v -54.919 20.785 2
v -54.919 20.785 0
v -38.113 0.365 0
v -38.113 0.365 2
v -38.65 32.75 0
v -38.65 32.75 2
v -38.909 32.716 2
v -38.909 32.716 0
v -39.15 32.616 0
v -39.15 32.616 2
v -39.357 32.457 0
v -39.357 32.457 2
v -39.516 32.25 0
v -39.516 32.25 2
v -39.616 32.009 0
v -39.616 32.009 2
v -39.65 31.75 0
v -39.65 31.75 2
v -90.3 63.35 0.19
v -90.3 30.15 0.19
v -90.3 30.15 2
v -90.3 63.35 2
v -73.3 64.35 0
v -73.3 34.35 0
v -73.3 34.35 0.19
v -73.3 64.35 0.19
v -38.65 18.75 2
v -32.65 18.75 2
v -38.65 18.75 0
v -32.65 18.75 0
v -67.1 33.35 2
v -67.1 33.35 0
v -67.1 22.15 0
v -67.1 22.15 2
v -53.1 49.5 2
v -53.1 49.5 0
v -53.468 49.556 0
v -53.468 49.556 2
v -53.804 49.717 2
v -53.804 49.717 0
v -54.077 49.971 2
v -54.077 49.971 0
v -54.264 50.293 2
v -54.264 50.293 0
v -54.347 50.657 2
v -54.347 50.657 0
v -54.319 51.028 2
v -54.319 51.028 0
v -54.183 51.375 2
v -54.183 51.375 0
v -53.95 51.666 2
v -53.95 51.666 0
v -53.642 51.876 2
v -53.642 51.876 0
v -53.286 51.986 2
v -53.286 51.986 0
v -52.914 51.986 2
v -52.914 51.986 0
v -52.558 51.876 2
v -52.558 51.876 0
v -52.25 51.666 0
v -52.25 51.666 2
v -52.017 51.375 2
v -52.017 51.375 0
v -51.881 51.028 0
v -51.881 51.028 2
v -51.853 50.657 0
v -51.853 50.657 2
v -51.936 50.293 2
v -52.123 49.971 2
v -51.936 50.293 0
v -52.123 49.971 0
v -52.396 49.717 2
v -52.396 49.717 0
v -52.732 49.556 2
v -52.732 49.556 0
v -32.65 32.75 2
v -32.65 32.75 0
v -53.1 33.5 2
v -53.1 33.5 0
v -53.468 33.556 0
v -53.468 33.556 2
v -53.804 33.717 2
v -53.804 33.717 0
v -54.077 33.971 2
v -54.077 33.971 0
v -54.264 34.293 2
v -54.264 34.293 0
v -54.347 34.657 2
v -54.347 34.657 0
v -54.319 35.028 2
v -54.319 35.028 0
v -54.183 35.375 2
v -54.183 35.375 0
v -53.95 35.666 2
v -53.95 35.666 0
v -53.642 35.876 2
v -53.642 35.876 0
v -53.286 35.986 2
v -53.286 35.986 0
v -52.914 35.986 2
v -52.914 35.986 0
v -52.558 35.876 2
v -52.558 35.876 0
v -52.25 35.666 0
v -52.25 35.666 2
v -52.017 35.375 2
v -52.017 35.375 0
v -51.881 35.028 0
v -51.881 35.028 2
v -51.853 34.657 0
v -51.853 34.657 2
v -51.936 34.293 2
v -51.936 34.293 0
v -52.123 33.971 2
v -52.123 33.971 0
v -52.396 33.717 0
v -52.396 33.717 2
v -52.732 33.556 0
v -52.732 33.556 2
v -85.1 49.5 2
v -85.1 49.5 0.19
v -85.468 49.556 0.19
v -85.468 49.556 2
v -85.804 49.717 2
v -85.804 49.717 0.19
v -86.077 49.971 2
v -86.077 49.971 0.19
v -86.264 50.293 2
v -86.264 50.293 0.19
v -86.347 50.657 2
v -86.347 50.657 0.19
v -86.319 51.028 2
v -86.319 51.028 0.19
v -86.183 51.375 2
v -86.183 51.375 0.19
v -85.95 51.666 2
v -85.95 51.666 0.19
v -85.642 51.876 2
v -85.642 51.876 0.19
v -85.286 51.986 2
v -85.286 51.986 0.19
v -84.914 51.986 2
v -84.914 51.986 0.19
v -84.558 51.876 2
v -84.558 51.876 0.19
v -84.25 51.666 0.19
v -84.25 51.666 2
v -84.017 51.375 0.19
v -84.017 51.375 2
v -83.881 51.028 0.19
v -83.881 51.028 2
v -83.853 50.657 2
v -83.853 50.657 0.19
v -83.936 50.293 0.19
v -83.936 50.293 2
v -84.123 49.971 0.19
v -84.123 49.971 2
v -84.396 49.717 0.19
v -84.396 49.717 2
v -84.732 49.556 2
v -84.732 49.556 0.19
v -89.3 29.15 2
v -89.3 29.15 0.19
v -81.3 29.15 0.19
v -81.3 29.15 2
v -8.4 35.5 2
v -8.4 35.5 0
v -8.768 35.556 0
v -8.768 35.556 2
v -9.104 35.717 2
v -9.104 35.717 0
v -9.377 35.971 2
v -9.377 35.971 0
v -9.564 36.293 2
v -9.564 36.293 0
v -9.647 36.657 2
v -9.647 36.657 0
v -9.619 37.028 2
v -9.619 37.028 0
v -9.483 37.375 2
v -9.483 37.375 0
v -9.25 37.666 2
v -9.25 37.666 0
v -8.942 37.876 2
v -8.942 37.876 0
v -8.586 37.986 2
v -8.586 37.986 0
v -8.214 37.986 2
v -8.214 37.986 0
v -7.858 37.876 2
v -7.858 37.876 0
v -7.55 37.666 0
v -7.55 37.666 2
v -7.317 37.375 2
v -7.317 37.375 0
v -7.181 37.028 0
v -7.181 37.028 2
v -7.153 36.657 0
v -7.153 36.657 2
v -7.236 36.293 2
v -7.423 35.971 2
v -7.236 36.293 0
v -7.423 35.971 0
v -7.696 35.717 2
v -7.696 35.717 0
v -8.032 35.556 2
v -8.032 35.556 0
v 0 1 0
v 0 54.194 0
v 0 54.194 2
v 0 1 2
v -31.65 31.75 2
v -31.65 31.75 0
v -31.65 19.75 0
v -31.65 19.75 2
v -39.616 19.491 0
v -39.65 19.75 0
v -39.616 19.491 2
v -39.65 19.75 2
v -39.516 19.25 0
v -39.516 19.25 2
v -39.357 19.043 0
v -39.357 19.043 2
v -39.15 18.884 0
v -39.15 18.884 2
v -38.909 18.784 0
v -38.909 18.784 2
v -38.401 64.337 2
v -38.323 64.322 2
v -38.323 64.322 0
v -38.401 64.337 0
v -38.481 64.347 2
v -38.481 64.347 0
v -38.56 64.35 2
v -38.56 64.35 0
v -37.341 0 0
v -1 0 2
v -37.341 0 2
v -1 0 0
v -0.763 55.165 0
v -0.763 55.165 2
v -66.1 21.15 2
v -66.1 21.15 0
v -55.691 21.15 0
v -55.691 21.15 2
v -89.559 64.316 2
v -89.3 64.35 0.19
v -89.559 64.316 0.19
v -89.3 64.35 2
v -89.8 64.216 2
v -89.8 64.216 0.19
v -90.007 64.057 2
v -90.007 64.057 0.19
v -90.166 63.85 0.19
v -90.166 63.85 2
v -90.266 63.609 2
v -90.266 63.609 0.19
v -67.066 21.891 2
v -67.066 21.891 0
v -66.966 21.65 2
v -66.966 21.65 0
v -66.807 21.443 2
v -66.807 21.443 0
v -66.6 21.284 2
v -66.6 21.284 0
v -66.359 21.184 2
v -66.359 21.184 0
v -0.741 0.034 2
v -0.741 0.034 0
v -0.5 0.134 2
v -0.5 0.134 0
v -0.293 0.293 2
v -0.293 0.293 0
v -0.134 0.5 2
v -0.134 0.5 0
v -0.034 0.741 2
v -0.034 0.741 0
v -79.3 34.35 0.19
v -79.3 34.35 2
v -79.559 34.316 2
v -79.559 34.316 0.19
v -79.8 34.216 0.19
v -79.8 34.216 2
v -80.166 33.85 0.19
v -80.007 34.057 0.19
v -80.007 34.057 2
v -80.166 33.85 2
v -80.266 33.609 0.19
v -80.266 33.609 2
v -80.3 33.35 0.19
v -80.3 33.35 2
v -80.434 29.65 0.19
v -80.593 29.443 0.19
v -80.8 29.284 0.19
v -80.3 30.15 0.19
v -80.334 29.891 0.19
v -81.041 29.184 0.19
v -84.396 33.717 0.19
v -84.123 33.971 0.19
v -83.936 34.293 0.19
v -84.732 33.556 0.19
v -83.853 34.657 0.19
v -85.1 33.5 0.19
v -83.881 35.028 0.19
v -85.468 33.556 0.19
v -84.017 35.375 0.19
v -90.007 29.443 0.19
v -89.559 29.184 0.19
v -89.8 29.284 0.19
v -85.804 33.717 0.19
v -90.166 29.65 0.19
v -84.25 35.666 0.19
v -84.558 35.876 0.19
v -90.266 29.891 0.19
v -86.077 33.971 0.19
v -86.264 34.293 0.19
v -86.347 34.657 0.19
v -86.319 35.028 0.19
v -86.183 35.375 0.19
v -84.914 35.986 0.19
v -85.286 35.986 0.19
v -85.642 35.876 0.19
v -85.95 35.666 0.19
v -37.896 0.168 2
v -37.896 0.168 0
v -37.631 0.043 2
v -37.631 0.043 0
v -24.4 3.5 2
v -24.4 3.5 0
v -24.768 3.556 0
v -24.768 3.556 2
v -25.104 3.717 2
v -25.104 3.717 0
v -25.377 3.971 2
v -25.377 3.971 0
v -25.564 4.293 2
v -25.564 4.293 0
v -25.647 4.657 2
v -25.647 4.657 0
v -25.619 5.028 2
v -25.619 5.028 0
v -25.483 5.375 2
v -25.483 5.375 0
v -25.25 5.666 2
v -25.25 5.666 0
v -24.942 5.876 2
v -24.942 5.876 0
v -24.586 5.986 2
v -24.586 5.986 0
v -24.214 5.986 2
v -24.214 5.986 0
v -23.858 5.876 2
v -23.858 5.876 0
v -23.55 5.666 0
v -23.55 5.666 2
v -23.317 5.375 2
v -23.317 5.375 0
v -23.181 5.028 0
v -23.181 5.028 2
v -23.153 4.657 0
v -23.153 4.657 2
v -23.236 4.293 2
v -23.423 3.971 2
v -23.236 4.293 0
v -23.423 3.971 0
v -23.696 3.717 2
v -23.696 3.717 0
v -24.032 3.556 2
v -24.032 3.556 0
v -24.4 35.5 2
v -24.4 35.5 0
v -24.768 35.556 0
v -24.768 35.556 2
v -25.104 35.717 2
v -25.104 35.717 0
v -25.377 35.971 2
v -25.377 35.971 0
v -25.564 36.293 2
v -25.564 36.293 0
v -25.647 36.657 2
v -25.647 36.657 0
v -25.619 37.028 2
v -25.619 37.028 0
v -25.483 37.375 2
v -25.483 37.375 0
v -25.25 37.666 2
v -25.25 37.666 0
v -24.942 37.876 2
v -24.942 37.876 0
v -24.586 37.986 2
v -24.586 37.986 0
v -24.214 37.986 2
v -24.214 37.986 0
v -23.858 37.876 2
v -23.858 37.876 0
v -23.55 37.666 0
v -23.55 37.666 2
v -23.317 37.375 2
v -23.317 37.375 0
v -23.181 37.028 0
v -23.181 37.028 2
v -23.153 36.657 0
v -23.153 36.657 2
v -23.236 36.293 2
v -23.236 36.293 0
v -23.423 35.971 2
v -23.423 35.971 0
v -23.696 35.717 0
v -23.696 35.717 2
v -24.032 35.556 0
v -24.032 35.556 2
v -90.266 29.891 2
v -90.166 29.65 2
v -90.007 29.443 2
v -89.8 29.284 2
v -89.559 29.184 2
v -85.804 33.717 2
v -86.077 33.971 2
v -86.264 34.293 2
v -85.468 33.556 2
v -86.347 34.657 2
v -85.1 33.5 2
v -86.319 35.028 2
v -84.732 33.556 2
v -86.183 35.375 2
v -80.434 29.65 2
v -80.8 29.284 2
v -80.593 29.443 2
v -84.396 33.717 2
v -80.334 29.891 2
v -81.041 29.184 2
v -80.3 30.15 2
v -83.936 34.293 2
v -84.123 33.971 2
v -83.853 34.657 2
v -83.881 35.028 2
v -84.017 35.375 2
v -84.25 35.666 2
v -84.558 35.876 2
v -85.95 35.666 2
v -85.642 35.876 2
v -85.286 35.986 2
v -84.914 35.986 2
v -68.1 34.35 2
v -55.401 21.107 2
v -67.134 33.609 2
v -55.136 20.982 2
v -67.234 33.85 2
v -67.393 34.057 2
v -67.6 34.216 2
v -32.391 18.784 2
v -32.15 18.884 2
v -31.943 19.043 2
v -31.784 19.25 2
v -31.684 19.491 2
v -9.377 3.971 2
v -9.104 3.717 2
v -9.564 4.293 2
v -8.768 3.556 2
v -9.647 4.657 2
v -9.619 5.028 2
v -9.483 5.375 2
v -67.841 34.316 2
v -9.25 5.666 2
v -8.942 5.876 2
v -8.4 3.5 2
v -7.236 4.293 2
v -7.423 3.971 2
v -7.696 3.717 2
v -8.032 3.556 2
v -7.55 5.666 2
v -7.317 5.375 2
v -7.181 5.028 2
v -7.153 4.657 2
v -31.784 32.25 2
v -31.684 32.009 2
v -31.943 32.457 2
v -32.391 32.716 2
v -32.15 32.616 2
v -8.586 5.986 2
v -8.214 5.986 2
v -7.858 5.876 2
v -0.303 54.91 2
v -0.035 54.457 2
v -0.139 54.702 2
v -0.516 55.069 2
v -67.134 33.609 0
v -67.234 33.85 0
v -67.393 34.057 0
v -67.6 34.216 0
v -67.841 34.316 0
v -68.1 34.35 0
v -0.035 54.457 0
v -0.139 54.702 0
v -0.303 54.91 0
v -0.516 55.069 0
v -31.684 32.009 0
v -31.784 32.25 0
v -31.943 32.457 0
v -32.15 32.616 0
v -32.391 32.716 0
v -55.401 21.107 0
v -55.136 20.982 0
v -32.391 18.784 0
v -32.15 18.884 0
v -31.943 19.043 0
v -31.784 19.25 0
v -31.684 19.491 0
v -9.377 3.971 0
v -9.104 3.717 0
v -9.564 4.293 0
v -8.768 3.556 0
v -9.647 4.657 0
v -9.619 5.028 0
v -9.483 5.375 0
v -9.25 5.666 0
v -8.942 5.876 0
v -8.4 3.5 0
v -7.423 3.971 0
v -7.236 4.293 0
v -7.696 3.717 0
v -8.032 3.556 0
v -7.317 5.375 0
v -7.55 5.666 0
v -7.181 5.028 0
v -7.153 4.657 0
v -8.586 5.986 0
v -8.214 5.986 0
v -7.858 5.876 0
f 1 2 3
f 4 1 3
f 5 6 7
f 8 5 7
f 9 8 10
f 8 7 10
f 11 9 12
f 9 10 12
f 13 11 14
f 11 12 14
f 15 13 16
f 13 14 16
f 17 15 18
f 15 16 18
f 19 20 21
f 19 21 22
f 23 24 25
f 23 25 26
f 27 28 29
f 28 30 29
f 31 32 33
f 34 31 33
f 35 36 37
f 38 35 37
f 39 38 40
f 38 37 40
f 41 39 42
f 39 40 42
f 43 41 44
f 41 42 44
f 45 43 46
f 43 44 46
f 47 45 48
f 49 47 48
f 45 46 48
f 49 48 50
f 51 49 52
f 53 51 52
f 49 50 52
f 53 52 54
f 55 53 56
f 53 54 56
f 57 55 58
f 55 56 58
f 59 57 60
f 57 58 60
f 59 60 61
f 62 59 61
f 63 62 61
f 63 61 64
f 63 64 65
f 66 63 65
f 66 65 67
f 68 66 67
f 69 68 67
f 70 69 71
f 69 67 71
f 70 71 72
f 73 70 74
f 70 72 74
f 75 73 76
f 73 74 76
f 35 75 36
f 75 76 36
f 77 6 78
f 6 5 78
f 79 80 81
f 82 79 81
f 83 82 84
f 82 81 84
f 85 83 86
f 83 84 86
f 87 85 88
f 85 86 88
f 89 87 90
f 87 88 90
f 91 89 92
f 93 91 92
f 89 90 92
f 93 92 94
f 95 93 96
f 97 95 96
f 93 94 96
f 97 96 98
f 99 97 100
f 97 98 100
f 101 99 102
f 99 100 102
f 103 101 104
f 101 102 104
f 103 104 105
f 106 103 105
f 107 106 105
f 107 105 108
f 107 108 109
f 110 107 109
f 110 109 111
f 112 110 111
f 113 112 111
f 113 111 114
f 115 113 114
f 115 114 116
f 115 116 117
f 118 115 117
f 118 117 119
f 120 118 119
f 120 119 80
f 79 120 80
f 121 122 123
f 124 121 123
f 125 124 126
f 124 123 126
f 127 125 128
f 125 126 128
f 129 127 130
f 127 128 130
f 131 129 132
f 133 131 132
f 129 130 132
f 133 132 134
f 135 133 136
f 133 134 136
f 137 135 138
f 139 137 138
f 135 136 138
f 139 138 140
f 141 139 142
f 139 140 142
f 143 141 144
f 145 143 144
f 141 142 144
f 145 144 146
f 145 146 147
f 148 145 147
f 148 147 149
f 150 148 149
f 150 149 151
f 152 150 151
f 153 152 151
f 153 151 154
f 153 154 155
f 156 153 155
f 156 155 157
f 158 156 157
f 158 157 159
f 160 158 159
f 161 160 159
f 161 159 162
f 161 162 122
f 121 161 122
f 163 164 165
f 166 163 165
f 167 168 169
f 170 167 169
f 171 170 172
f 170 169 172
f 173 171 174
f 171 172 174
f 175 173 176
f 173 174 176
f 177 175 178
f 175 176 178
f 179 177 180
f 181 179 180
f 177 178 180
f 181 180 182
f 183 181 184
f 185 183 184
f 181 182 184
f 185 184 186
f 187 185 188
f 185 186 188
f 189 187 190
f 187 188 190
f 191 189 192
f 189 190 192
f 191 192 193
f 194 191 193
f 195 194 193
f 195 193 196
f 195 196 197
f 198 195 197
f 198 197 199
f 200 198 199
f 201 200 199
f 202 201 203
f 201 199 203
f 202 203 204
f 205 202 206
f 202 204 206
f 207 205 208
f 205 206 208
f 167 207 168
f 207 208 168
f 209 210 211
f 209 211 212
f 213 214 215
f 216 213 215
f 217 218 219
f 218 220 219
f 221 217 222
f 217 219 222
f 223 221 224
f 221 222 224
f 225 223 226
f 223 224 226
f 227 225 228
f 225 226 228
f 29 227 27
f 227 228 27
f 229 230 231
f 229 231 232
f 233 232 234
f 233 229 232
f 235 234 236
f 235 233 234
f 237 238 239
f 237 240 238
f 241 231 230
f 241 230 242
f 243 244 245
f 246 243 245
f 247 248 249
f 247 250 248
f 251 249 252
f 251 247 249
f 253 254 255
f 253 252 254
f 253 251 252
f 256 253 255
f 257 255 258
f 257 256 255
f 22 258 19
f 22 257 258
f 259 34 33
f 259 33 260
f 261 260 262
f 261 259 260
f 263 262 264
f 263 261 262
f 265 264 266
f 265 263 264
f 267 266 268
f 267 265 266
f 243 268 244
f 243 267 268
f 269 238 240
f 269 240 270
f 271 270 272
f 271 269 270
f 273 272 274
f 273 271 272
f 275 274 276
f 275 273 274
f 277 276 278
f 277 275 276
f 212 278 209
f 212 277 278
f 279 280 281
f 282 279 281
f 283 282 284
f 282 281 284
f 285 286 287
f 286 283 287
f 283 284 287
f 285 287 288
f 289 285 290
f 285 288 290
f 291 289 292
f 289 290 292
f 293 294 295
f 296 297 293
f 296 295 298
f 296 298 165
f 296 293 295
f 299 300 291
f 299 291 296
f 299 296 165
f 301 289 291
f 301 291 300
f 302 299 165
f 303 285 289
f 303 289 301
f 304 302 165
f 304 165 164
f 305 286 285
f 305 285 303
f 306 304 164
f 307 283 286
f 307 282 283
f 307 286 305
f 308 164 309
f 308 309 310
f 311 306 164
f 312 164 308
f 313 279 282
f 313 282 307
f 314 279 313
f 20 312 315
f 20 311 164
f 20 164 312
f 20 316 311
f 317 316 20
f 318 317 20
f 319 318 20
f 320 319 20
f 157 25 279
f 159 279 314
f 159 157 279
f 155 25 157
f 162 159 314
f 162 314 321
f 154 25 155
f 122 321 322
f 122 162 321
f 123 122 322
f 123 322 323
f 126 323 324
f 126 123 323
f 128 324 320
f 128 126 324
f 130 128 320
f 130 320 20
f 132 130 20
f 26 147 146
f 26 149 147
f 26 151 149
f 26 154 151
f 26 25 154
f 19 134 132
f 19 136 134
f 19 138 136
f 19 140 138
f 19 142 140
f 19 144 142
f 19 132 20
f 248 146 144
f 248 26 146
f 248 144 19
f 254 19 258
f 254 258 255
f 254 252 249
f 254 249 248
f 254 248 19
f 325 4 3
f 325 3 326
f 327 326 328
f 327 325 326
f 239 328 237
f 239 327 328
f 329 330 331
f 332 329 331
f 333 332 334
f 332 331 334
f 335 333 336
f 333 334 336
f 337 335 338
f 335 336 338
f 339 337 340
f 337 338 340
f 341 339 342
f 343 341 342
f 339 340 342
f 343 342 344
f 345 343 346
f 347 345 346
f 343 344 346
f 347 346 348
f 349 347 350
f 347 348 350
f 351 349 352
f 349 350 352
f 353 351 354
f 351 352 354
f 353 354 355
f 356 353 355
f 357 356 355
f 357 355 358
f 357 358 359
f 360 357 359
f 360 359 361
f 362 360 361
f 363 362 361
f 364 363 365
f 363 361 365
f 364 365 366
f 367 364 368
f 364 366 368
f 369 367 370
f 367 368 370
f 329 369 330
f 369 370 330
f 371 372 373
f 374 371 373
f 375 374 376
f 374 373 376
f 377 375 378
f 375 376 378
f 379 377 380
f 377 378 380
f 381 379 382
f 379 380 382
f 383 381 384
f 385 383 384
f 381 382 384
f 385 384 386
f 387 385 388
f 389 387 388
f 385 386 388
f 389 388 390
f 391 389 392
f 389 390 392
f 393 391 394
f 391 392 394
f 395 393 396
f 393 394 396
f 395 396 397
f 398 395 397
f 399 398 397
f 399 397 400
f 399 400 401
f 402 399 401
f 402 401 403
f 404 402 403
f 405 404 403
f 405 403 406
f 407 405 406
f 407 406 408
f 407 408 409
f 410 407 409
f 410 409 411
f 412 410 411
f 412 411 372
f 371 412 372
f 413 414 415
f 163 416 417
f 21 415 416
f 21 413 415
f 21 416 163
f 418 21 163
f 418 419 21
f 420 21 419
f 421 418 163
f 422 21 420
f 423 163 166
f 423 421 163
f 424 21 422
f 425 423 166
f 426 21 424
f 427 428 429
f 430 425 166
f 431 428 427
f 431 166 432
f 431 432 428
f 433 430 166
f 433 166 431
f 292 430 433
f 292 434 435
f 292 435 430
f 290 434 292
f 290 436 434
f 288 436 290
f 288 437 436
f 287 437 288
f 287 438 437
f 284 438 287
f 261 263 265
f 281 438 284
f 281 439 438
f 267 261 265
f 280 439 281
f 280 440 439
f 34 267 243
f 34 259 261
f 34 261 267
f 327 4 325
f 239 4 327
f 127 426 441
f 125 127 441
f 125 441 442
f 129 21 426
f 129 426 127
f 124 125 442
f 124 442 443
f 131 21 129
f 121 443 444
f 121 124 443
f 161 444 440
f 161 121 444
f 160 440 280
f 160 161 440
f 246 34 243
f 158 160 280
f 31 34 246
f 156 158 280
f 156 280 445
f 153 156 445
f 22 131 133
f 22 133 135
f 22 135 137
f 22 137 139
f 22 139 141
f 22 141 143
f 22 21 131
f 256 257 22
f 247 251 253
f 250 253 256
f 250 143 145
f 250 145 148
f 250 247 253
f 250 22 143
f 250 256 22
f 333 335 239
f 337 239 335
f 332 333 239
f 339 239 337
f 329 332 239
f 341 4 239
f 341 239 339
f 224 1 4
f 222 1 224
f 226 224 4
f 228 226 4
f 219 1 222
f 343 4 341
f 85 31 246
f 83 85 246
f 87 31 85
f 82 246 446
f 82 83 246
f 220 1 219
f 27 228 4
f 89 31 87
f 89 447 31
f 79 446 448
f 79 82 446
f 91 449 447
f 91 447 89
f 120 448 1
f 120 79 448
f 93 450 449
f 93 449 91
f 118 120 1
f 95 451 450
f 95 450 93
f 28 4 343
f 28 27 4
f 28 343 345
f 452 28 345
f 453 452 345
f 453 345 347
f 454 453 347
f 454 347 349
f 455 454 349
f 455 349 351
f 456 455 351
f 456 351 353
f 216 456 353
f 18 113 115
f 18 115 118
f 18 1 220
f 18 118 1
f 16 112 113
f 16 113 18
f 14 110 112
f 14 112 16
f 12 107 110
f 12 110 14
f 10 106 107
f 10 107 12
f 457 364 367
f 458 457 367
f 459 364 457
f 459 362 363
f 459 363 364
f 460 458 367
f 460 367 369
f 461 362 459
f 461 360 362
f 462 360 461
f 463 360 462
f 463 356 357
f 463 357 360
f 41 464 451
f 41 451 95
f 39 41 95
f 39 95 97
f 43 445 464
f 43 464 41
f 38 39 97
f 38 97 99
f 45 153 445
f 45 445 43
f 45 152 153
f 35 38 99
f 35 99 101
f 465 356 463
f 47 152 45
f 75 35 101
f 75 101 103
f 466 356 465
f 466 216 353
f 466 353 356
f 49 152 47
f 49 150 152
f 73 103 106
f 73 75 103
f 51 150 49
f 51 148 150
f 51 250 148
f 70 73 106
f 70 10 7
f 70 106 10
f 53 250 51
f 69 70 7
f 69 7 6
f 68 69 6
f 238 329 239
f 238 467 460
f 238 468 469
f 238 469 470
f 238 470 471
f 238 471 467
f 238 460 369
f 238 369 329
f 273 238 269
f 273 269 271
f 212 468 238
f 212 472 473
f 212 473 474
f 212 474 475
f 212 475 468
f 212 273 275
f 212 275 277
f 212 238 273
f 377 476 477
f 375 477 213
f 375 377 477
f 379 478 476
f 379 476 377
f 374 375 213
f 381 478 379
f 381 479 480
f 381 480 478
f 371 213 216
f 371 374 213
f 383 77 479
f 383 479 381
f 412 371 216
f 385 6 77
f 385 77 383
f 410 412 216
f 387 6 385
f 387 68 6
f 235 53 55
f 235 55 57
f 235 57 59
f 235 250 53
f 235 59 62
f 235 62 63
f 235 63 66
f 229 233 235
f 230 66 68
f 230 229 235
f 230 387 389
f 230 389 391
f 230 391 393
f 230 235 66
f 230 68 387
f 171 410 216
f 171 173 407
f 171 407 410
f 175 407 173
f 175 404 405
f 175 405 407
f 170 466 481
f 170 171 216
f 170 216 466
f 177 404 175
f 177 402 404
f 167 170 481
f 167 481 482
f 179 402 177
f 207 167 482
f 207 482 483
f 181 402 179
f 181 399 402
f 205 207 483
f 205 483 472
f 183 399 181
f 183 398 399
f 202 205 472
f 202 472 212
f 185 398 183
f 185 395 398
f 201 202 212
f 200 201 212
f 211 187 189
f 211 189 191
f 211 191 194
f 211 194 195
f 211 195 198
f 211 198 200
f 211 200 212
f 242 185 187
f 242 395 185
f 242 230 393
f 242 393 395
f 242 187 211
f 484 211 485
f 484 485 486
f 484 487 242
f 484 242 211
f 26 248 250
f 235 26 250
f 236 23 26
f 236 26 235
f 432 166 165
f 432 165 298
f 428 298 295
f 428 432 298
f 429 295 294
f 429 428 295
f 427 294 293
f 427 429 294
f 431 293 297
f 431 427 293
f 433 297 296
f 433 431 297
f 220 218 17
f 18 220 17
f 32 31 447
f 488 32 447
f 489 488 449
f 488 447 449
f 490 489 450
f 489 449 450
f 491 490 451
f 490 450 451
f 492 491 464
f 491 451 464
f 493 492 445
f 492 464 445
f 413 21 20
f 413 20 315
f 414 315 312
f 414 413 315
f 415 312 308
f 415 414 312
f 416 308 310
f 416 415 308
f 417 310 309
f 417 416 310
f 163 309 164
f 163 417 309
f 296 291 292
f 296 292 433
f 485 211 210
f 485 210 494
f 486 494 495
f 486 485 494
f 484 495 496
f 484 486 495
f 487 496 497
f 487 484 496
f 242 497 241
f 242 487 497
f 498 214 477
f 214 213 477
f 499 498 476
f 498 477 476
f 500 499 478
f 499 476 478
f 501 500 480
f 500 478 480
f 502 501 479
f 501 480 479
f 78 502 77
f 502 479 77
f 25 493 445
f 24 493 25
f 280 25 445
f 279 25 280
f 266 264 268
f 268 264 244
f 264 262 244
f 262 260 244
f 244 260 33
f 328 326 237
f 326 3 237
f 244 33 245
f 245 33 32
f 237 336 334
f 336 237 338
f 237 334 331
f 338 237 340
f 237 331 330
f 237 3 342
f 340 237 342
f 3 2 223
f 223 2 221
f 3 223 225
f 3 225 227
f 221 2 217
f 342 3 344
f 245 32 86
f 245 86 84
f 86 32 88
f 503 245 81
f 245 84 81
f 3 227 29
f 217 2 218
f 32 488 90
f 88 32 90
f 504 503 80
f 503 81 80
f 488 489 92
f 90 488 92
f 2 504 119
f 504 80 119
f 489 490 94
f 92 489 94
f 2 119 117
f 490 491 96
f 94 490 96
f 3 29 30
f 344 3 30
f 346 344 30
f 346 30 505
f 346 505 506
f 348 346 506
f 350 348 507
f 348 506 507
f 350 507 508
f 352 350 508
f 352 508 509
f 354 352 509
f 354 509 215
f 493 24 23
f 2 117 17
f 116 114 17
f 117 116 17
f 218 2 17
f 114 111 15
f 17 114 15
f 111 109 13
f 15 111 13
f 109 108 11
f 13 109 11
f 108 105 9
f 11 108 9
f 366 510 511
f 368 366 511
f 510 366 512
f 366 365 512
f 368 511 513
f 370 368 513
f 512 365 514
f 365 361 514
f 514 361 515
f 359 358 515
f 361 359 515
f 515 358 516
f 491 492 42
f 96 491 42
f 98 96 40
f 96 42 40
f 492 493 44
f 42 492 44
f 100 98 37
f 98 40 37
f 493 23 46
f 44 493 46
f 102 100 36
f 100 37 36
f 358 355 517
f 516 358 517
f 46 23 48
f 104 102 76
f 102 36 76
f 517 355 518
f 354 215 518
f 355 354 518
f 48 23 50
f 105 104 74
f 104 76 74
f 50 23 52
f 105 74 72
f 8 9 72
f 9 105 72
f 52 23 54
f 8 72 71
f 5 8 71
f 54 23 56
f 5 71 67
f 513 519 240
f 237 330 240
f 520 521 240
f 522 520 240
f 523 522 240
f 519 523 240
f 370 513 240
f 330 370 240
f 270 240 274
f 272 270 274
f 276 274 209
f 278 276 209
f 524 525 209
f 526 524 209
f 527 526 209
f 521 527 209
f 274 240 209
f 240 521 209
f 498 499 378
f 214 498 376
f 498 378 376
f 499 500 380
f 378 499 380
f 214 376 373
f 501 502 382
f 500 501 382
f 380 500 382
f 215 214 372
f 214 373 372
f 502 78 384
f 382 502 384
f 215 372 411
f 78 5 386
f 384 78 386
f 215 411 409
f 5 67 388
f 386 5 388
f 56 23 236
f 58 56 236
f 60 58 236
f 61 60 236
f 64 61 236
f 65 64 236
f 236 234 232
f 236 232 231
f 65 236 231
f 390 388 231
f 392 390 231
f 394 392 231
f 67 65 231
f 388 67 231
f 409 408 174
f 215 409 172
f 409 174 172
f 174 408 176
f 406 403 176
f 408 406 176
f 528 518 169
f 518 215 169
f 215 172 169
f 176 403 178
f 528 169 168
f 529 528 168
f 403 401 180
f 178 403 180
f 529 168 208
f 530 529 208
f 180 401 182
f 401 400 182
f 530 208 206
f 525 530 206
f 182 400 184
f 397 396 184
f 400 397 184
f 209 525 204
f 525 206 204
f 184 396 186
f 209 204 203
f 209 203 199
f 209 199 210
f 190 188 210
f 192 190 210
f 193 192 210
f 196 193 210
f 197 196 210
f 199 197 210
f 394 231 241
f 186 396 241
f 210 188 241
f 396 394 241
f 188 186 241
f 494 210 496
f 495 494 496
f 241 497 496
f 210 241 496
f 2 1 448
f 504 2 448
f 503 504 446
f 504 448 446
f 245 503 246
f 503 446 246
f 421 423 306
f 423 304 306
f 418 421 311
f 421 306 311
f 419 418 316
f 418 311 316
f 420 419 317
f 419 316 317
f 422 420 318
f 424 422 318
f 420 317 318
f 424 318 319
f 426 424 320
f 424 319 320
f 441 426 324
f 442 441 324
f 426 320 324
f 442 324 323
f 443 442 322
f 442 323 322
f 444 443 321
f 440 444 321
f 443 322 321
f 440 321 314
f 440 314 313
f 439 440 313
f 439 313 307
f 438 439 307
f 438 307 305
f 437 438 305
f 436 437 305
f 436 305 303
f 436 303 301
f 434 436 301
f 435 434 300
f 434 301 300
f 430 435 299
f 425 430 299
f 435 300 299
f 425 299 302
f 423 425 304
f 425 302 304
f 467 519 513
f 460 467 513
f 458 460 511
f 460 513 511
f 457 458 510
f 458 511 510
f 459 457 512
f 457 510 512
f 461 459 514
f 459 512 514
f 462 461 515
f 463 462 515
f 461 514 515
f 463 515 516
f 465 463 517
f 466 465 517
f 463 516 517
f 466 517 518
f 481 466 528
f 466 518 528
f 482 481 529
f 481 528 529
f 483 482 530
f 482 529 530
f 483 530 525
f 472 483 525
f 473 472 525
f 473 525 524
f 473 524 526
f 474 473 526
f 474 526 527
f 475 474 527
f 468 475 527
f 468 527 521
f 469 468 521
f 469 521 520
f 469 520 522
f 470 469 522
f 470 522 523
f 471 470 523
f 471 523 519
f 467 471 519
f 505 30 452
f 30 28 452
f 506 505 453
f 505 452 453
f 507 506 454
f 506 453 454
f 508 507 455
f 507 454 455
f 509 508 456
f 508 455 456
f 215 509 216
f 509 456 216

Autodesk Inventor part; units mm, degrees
ref_plane "YZ Plane" through (0, 0, 0) normal (1, 0, 0) x (0, 1, 0)
ref_plane "XZ Plane" through (0, 0, 0) normal (0, 1, 0) x (-1, 0, 0)
ref_plane "XY Plane" through (0, 0, 0) normal (0, 0, 1) x (1, 0, 0)
sketch "スケッチ1" plane through (0, 0, 0) normal (0, 0, 1) x (1, 0, 0)
  line L0 (0, 0) -> (-90.3, 0)
  line L1 (-90.3, 0) -> (-90.3, 64.35)
  line L2 (-90.3, 64.35) -> (0, 64.35)
  line L3 (0, 64.35) -> (0, 0)
  line L4 (-90.3, 21.15) -> (0, 21.15)
  line L5 (-55.219, 21.15) -> (-37.813, 0)
  line L6 (-90.3, 29.15) -> (0, 29.15)
  line L7 (-80.3, 29.15) -> (-67.1, 29.15)
  line L8 (-67.1, 29.15) -> (-67.1, 34.35)
  line L9 (-67.1, 34.35) -> (-80.3, 34.35)
  line L10 (-80.3, 34.35) -> (-80.3, 29.15)
  line L11 (-67.1, 29.15) -> (-67.1, 21.15)
  line L12 (-38.44, 64.35) -> (0, 54.9793)
  dimension "d0" = 90.3
  dimension "d1" = 64.35
  dimension "d2" = 21.15
  dimension "d3" = 55.219
  dimension "d4" = 37.813
  dimension "d5" = 35.2
  dimension "d6" = 10
  dimension "d7" = 5.2
  dimension "d8" = 13.2
  dimension "d9" = 166.3
  dimension "d10" = 51.86
extrude "押し出し1" add sketch "スケッチ1" along normal blind 2 contours L0 L5 L4 L3 | L4 L11 L6 L3 | L6 L8 L9 L10 L1 L2 L12 L3
sketch "スケッチ2" plane through (0, 0, 2) normal (0, 0, 1) x (1, 0, 0)
  line L0 (-85.1, 34.75) -> (-53.1, 34.75)
  line L1 (-53.1, 34.75) -> (-53.1, 50.75)
  line L2 (-53.1, 50.75) -> (-85.1, 50.75)
  line L3 (-85.1, 50.75) -> (-85.1, 34.75)
  line L4 (-90.3, 29.15) -> (-80.3, 29.15) projected
  line L5 (-90.3, 64.35) -> (-90.3, 29.15) projected
  line L6 (-8.4, 4.75) -> (-24.4, 4.75)
  line L7 (-24.4, 4.75) -> (-24.4, 36.75)
  line L8 (-24.4, 36.75) -> (-8.4, 36.75)
  line L9 (-8.4, 36.75) -> (-8.4, 4.75)
  line L10 (0, 0) -> (0, 54.9793) projected
  line L11 (-37.813, 0) -> (0, 0) projected
  dimension "d13" = 5.6
  dimension "d14" = 5.2
  dimension "d15" = 16
  dimension "d16" = 32
  dimension "d17" = 8.4
  dimension "d18" = 4.75
  dimension "d19" = 16
  dimension "d20" = 32
hole "穴1" at (-85.1, 50.75, 2) at (-85.1, 34.75, 2) at (-53.1, 34.75, 2) at (-53.1, 50.75, 2) at (-24.4, 4.75, 2) at (-8.4, 4.75, 2) at (-8.4, 36.75, 2) at (-24.4, 36.75, 2) direction (0, 0, -1) diameter 2.5 end through all
fillet "フィレット1" radius 1 11 edges at (0, 0, 1) (0, 54.9793, 1) (-90.3, 64.35, 1) (-90.3, 29.15, 1) (-80.3, 29.15, 1) (-80.3, 34.35, 1) (-67.1, 34.35, 1) (-67.1, 21.15, 1) (-55.219, 21.15, 1) (-37.813, 0, 1) (-38.44, 64.35, 1)
sketch "スケッチ3" plane through (0, 0, 0) normal (0, 0, -1) x (-1, 0, 0)
  line L0 (31.65, 18.75) -> (39.65, 18.75)
  line L1 (39.65, 18.75) -> (39.65, 32.75)
  line L2 (39.65, 32.75) -> (31.65, 32.75)
  line L3 (31.65, 32.75) -> (31.65, 18.75)
  circle A0 centre (24.4, 4.75) radius 1.25 projected
  circle A1 centre (24.4, 36.75) radius 1.25 projected
  point P0 (0, 0)
  dimension "d29" = 14
  dimension "d30" = 14
  dimension "d31" = 8
  dimension "d32" = 6
extrude "押し出し2" cut sketch "スケッチ3" against normal blind 10 contours L3 L2 L1 L0
fillet "フィレット2" radius 1 4 edges at (-31.65, 18.75, 1) (-31.65, 32.75, 1) (-39.65, 32.75, 1) (-39.65, 18.75, 1)
sketch "スケッチ5" plane through (0, 0, 0) normal (0, 0, -1) x (-1, 0, 0)
  line L0 (79.3, 34.35) -> (68.1, 34.35) projected
  line L1 (73.3, 34.35) -> (73.3, 64.35)
  line L2 (38.5601, 64.35) -> (89.3, 64.35) projected
  line L3 (90.3, 63.35) -> (90.3, 30.15) projected
  arc A0 (80.3, 33.35) -> (79.3, 34.35) centre (79.3, 33.35) ccw projected
  arc A1 (80.3, 33.35) -> (79.3, 34.35) centre (79.3, 33.35) ccw
  arc A2 (80.3, 30.15) -> (81.3, 29.15) centre (81.3, 30.15) ccw projected
  arc A3 (80.3, 30.15) -> (81.3, 29.15) centre (81.3, 30.15) ccw
  arc A4 (89.3, 29.15) -> (90.3, 30.15) centre (89.3, 30.15) ccw projected
  arc A5 (89.3, 29.15) -> (90.3, 30.15) centre (89.3, 30.15) ccw
  arc A6 (90.3, 63.35) -> (89.3, 64.35) centre (89.3, 63.35) ccw projected
  arc A7 (90.3, 63.35) -> (89.3, 64.35) centre (89.3, 63.35) ccw
  line L4 (73.3, 64.35) -> (89.3, 64.35)
  line L5 (90.3, 63.35) -> (90.3, 30.15)
  line L6 (89.3, 29.15) -> (81.3, 29.15)
  line L7 (80.3, 30.15) -> (80.3, 33.35)
  line L8 (79.3, 34.35) -> (73.3, 34.35)
  point P0 (0, 0)
  dimension "d36" = 17
extrude "押し出し3" cut sketch "スケッチ5" against normal blind 0.19
equation "\"BendRadius\" = Thickness"
equation "\"BendReliefWidth\" = Thickness"
equation "\"BendReliefDepth\" = 0.5 * Thickness"
equation "\"CornerReliefSize\" = 4 * Thickness"
equation "\"MinimumRemnant\" = 2 * Thickness"
equation "\"TransitionRadius\" = BendRadius"
equation "\"JacobiRadiusSize\" = BendRadius"
equation "\"GapSize\" = Thickness"
equation "\"Thickness\" = 3.048"
properties part number "connectplate2" material "アルミニウム 6061"
